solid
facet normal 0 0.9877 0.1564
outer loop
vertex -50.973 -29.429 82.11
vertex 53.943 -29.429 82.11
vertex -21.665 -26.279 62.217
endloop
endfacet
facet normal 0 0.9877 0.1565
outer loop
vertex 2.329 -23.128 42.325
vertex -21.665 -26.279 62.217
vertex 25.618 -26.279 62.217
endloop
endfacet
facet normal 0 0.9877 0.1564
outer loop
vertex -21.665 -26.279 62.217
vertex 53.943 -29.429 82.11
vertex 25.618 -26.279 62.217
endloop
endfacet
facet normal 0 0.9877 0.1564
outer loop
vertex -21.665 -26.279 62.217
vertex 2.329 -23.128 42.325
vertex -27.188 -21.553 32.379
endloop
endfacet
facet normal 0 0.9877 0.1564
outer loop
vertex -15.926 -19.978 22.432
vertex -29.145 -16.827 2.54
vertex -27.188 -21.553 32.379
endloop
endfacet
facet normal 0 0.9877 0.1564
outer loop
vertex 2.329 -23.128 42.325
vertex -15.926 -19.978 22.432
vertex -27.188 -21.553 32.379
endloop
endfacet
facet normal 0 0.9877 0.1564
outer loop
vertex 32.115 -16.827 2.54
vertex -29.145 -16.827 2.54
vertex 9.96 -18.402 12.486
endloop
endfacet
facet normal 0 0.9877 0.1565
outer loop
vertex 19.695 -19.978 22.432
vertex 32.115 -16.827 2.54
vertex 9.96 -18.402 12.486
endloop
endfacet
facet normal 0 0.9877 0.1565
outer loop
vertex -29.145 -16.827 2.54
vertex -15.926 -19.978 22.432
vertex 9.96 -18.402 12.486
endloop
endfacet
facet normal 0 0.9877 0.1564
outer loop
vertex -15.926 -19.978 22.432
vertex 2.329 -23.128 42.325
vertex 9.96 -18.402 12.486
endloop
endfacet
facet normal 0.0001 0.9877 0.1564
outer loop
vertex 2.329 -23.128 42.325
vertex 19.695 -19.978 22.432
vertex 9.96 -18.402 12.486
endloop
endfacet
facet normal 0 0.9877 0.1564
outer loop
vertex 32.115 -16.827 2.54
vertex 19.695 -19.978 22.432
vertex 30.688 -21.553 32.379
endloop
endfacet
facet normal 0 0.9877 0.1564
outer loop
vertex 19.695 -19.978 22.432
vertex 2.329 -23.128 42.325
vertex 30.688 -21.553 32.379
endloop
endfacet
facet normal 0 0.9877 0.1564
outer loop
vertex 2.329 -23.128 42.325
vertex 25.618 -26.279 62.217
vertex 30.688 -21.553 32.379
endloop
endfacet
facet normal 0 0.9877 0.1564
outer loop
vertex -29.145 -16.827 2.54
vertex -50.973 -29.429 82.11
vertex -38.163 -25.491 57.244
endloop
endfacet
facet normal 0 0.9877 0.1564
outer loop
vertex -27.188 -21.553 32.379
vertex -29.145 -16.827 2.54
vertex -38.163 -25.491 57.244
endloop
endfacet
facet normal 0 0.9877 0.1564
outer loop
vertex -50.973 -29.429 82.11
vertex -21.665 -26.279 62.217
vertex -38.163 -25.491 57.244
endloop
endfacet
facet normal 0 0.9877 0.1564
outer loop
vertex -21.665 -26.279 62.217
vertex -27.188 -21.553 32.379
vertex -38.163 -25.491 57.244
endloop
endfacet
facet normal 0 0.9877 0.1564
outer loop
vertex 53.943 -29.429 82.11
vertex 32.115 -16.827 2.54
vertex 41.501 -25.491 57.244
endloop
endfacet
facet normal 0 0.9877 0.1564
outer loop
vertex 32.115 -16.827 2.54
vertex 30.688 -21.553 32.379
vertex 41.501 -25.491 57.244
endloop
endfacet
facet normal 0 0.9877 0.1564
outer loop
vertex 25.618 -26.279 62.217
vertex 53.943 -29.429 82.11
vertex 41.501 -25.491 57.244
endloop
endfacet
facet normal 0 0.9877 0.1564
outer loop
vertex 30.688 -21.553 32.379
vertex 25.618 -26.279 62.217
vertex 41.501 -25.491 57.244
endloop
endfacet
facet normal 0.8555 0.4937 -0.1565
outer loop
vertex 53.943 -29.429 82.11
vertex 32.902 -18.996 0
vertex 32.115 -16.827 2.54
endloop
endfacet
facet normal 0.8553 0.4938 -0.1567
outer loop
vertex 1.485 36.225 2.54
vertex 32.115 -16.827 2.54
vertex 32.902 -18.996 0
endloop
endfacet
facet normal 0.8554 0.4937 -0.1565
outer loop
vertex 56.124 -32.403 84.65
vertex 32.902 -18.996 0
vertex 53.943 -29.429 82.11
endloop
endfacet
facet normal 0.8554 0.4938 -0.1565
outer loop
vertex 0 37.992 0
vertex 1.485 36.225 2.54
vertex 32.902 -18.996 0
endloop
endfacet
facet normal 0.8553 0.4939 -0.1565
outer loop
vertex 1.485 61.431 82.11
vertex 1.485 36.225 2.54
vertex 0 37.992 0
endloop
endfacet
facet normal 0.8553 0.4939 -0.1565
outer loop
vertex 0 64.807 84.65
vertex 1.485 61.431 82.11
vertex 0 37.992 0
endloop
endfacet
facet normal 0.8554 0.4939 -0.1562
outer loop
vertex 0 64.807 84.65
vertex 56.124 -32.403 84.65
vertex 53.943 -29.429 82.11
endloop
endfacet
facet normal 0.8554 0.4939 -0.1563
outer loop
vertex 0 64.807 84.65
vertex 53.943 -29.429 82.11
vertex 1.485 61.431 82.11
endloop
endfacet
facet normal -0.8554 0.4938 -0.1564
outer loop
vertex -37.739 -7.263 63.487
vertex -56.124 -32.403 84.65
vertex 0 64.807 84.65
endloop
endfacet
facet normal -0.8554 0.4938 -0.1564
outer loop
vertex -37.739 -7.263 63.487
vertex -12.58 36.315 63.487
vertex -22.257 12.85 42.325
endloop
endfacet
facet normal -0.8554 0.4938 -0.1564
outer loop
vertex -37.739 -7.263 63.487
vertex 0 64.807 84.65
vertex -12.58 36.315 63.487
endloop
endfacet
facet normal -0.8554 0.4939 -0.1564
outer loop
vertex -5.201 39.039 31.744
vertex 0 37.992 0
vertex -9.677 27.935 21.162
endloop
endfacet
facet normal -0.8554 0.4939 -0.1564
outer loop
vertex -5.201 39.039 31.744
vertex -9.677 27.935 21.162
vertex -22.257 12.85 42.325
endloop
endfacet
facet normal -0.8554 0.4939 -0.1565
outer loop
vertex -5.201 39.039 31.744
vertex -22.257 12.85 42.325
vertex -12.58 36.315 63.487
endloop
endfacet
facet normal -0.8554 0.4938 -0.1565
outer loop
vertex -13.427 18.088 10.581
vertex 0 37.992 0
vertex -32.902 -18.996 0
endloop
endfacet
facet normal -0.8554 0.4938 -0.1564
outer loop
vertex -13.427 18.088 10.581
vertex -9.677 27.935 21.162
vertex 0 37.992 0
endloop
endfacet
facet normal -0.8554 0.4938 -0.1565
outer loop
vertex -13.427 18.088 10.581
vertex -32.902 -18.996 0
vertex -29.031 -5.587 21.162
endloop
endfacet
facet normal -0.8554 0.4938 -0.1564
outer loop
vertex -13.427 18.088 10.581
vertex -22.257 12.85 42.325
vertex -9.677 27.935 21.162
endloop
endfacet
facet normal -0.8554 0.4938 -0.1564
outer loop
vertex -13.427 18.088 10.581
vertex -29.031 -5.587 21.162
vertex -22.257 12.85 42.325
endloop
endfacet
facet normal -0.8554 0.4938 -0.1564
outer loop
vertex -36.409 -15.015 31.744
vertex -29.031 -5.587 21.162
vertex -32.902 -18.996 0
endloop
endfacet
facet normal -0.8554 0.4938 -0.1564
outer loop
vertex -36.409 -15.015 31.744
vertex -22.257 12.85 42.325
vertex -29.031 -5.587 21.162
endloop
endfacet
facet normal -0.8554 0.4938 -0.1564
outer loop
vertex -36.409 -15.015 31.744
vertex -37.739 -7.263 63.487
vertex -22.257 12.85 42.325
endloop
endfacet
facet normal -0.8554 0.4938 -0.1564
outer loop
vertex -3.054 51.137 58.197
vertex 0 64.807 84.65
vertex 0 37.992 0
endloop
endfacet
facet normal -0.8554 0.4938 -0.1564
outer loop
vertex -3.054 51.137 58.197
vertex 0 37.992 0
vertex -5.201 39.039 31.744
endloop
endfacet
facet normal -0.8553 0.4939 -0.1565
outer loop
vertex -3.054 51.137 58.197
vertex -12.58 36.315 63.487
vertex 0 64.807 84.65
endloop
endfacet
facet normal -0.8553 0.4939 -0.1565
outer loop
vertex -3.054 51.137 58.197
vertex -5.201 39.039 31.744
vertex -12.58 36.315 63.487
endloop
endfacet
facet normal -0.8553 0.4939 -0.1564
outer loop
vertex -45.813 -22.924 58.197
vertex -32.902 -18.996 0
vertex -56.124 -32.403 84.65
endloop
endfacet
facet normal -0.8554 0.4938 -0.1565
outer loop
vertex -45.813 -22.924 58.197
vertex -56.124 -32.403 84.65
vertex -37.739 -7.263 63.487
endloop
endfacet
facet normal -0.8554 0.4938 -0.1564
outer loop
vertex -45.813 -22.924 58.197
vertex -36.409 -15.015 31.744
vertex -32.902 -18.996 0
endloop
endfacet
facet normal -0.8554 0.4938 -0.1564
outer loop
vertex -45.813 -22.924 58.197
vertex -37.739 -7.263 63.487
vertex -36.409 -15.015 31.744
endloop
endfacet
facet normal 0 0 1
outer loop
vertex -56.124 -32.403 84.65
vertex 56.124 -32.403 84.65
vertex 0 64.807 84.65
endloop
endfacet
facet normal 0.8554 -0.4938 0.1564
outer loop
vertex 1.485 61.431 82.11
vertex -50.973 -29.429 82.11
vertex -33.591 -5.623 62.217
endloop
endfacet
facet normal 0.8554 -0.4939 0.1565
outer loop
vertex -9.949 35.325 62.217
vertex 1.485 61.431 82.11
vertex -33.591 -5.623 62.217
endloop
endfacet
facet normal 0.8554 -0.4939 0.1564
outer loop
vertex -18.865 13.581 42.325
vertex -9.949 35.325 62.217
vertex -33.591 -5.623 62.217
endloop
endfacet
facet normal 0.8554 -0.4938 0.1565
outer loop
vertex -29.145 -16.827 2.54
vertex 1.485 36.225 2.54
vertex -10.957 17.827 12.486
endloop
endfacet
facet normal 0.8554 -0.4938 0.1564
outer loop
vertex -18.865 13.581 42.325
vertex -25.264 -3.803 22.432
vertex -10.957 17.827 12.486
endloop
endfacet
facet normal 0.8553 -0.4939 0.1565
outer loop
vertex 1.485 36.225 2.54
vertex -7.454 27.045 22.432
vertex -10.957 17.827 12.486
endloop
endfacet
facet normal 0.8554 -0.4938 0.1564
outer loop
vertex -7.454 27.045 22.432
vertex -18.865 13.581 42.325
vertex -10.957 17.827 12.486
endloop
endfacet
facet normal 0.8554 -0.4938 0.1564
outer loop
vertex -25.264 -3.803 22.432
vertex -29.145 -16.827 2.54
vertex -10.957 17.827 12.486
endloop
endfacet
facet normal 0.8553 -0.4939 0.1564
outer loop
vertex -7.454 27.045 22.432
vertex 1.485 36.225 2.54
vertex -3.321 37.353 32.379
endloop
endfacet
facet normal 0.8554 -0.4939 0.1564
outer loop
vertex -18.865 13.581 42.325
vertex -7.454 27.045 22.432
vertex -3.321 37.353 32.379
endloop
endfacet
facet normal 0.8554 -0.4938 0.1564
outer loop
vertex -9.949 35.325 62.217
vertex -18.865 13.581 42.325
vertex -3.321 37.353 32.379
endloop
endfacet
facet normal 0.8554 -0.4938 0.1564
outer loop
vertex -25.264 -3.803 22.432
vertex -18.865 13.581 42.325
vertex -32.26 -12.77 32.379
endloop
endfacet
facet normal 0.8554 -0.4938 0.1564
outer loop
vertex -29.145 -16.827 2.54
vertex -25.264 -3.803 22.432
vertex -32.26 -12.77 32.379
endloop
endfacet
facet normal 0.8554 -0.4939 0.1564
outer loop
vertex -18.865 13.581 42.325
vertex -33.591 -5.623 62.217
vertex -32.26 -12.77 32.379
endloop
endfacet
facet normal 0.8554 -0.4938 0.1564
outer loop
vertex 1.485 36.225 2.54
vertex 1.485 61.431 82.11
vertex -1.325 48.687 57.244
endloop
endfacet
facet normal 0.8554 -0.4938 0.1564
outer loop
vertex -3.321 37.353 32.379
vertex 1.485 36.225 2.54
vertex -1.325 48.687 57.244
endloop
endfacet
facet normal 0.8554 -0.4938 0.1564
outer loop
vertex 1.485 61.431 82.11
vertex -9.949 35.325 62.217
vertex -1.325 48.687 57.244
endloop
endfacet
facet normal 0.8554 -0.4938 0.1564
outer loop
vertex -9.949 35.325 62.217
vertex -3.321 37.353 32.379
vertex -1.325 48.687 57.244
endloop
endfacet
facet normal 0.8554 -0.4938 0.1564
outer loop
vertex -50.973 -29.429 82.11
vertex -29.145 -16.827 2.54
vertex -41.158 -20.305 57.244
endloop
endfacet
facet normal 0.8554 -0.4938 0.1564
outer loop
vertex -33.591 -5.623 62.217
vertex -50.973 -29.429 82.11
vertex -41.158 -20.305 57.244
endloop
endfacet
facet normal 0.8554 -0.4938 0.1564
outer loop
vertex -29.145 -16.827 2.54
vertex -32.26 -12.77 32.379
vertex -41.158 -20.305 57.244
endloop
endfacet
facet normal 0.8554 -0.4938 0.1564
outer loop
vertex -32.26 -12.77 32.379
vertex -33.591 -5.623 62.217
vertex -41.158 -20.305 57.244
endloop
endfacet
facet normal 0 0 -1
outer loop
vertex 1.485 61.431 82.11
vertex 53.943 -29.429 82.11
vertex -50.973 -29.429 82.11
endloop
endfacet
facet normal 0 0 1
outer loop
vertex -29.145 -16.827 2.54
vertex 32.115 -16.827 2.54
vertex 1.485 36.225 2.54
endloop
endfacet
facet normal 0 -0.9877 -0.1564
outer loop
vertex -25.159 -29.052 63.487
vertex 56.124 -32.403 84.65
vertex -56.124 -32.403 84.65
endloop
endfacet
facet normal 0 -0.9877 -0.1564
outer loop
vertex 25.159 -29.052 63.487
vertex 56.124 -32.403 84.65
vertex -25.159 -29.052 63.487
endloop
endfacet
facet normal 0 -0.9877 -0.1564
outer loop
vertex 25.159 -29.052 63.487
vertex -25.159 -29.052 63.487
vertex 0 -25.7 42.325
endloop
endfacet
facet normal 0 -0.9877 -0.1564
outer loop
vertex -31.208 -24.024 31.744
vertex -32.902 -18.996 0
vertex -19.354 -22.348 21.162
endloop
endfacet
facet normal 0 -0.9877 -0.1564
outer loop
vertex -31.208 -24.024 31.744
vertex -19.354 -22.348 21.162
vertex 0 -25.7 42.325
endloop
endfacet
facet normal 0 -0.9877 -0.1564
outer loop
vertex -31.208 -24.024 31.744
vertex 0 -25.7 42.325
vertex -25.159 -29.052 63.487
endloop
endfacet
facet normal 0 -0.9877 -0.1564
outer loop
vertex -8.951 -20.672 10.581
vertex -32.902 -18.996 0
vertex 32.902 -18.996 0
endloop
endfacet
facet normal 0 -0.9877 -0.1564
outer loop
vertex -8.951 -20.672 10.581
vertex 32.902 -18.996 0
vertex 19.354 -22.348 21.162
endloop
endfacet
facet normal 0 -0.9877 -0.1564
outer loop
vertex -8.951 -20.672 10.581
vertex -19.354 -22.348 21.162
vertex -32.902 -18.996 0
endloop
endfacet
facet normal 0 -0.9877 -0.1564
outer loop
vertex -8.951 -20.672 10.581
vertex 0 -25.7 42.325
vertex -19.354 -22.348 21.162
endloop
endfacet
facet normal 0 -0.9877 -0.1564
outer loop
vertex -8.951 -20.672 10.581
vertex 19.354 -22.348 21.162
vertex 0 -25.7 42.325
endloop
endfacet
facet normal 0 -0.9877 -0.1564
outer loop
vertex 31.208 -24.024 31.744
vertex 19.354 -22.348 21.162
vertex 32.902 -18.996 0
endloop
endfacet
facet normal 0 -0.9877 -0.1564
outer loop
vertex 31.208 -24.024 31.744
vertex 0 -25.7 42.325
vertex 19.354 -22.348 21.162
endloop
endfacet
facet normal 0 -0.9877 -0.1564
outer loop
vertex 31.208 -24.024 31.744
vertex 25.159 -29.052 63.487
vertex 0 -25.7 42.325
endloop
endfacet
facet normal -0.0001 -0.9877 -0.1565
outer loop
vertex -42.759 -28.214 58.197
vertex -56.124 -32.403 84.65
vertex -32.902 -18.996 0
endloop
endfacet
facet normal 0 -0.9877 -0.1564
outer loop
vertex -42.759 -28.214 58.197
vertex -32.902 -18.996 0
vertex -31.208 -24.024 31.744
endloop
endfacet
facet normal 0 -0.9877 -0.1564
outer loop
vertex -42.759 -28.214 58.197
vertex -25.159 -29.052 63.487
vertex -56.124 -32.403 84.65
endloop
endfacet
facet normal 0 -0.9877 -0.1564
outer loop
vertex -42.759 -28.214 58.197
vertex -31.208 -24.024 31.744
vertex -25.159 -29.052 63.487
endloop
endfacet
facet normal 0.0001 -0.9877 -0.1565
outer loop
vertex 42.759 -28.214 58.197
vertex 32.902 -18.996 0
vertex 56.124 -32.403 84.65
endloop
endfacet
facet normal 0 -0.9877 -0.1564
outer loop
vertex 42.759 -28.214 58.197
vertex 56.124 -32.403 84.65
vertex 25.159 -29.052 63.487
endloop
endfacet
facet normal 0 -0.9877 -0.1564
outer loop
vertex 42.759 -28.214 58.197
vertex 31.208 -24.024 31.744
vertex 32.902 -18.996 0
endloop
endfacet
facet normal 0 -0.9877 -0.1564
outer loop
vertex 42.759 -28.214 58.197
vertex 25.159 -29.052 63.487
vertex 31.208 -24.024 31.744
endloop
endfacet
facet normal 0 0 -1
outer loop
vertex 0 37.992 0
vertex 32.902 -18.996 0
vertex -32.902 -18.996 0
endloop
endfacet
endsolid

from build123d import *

# Parameters (mm, degrees)
F1_DEPTH = 84.64962
F1_TAPER = -9
F2_T     = -2.54


with BuildPart() as f1:
    # F0 (on Top) → F1 (new body)
    with BuildSketch(Plane.XY):
        Polygon((32.902453822, -18.9962405711), (0, 37.9924811423), (-32.902453822, -18.9962405711), align=None)
    extrude(amount=F1_DEPTH, taper=F1_TAPER)

    # F2
    f2_openings = [f1.faces().sort_by_distance(p)[0] for p in [
        (22.761478, 13.141345, 46.004837),
    ]]
    offset(amount=F2_T, openings=f2_openings)


solid = f1.part
